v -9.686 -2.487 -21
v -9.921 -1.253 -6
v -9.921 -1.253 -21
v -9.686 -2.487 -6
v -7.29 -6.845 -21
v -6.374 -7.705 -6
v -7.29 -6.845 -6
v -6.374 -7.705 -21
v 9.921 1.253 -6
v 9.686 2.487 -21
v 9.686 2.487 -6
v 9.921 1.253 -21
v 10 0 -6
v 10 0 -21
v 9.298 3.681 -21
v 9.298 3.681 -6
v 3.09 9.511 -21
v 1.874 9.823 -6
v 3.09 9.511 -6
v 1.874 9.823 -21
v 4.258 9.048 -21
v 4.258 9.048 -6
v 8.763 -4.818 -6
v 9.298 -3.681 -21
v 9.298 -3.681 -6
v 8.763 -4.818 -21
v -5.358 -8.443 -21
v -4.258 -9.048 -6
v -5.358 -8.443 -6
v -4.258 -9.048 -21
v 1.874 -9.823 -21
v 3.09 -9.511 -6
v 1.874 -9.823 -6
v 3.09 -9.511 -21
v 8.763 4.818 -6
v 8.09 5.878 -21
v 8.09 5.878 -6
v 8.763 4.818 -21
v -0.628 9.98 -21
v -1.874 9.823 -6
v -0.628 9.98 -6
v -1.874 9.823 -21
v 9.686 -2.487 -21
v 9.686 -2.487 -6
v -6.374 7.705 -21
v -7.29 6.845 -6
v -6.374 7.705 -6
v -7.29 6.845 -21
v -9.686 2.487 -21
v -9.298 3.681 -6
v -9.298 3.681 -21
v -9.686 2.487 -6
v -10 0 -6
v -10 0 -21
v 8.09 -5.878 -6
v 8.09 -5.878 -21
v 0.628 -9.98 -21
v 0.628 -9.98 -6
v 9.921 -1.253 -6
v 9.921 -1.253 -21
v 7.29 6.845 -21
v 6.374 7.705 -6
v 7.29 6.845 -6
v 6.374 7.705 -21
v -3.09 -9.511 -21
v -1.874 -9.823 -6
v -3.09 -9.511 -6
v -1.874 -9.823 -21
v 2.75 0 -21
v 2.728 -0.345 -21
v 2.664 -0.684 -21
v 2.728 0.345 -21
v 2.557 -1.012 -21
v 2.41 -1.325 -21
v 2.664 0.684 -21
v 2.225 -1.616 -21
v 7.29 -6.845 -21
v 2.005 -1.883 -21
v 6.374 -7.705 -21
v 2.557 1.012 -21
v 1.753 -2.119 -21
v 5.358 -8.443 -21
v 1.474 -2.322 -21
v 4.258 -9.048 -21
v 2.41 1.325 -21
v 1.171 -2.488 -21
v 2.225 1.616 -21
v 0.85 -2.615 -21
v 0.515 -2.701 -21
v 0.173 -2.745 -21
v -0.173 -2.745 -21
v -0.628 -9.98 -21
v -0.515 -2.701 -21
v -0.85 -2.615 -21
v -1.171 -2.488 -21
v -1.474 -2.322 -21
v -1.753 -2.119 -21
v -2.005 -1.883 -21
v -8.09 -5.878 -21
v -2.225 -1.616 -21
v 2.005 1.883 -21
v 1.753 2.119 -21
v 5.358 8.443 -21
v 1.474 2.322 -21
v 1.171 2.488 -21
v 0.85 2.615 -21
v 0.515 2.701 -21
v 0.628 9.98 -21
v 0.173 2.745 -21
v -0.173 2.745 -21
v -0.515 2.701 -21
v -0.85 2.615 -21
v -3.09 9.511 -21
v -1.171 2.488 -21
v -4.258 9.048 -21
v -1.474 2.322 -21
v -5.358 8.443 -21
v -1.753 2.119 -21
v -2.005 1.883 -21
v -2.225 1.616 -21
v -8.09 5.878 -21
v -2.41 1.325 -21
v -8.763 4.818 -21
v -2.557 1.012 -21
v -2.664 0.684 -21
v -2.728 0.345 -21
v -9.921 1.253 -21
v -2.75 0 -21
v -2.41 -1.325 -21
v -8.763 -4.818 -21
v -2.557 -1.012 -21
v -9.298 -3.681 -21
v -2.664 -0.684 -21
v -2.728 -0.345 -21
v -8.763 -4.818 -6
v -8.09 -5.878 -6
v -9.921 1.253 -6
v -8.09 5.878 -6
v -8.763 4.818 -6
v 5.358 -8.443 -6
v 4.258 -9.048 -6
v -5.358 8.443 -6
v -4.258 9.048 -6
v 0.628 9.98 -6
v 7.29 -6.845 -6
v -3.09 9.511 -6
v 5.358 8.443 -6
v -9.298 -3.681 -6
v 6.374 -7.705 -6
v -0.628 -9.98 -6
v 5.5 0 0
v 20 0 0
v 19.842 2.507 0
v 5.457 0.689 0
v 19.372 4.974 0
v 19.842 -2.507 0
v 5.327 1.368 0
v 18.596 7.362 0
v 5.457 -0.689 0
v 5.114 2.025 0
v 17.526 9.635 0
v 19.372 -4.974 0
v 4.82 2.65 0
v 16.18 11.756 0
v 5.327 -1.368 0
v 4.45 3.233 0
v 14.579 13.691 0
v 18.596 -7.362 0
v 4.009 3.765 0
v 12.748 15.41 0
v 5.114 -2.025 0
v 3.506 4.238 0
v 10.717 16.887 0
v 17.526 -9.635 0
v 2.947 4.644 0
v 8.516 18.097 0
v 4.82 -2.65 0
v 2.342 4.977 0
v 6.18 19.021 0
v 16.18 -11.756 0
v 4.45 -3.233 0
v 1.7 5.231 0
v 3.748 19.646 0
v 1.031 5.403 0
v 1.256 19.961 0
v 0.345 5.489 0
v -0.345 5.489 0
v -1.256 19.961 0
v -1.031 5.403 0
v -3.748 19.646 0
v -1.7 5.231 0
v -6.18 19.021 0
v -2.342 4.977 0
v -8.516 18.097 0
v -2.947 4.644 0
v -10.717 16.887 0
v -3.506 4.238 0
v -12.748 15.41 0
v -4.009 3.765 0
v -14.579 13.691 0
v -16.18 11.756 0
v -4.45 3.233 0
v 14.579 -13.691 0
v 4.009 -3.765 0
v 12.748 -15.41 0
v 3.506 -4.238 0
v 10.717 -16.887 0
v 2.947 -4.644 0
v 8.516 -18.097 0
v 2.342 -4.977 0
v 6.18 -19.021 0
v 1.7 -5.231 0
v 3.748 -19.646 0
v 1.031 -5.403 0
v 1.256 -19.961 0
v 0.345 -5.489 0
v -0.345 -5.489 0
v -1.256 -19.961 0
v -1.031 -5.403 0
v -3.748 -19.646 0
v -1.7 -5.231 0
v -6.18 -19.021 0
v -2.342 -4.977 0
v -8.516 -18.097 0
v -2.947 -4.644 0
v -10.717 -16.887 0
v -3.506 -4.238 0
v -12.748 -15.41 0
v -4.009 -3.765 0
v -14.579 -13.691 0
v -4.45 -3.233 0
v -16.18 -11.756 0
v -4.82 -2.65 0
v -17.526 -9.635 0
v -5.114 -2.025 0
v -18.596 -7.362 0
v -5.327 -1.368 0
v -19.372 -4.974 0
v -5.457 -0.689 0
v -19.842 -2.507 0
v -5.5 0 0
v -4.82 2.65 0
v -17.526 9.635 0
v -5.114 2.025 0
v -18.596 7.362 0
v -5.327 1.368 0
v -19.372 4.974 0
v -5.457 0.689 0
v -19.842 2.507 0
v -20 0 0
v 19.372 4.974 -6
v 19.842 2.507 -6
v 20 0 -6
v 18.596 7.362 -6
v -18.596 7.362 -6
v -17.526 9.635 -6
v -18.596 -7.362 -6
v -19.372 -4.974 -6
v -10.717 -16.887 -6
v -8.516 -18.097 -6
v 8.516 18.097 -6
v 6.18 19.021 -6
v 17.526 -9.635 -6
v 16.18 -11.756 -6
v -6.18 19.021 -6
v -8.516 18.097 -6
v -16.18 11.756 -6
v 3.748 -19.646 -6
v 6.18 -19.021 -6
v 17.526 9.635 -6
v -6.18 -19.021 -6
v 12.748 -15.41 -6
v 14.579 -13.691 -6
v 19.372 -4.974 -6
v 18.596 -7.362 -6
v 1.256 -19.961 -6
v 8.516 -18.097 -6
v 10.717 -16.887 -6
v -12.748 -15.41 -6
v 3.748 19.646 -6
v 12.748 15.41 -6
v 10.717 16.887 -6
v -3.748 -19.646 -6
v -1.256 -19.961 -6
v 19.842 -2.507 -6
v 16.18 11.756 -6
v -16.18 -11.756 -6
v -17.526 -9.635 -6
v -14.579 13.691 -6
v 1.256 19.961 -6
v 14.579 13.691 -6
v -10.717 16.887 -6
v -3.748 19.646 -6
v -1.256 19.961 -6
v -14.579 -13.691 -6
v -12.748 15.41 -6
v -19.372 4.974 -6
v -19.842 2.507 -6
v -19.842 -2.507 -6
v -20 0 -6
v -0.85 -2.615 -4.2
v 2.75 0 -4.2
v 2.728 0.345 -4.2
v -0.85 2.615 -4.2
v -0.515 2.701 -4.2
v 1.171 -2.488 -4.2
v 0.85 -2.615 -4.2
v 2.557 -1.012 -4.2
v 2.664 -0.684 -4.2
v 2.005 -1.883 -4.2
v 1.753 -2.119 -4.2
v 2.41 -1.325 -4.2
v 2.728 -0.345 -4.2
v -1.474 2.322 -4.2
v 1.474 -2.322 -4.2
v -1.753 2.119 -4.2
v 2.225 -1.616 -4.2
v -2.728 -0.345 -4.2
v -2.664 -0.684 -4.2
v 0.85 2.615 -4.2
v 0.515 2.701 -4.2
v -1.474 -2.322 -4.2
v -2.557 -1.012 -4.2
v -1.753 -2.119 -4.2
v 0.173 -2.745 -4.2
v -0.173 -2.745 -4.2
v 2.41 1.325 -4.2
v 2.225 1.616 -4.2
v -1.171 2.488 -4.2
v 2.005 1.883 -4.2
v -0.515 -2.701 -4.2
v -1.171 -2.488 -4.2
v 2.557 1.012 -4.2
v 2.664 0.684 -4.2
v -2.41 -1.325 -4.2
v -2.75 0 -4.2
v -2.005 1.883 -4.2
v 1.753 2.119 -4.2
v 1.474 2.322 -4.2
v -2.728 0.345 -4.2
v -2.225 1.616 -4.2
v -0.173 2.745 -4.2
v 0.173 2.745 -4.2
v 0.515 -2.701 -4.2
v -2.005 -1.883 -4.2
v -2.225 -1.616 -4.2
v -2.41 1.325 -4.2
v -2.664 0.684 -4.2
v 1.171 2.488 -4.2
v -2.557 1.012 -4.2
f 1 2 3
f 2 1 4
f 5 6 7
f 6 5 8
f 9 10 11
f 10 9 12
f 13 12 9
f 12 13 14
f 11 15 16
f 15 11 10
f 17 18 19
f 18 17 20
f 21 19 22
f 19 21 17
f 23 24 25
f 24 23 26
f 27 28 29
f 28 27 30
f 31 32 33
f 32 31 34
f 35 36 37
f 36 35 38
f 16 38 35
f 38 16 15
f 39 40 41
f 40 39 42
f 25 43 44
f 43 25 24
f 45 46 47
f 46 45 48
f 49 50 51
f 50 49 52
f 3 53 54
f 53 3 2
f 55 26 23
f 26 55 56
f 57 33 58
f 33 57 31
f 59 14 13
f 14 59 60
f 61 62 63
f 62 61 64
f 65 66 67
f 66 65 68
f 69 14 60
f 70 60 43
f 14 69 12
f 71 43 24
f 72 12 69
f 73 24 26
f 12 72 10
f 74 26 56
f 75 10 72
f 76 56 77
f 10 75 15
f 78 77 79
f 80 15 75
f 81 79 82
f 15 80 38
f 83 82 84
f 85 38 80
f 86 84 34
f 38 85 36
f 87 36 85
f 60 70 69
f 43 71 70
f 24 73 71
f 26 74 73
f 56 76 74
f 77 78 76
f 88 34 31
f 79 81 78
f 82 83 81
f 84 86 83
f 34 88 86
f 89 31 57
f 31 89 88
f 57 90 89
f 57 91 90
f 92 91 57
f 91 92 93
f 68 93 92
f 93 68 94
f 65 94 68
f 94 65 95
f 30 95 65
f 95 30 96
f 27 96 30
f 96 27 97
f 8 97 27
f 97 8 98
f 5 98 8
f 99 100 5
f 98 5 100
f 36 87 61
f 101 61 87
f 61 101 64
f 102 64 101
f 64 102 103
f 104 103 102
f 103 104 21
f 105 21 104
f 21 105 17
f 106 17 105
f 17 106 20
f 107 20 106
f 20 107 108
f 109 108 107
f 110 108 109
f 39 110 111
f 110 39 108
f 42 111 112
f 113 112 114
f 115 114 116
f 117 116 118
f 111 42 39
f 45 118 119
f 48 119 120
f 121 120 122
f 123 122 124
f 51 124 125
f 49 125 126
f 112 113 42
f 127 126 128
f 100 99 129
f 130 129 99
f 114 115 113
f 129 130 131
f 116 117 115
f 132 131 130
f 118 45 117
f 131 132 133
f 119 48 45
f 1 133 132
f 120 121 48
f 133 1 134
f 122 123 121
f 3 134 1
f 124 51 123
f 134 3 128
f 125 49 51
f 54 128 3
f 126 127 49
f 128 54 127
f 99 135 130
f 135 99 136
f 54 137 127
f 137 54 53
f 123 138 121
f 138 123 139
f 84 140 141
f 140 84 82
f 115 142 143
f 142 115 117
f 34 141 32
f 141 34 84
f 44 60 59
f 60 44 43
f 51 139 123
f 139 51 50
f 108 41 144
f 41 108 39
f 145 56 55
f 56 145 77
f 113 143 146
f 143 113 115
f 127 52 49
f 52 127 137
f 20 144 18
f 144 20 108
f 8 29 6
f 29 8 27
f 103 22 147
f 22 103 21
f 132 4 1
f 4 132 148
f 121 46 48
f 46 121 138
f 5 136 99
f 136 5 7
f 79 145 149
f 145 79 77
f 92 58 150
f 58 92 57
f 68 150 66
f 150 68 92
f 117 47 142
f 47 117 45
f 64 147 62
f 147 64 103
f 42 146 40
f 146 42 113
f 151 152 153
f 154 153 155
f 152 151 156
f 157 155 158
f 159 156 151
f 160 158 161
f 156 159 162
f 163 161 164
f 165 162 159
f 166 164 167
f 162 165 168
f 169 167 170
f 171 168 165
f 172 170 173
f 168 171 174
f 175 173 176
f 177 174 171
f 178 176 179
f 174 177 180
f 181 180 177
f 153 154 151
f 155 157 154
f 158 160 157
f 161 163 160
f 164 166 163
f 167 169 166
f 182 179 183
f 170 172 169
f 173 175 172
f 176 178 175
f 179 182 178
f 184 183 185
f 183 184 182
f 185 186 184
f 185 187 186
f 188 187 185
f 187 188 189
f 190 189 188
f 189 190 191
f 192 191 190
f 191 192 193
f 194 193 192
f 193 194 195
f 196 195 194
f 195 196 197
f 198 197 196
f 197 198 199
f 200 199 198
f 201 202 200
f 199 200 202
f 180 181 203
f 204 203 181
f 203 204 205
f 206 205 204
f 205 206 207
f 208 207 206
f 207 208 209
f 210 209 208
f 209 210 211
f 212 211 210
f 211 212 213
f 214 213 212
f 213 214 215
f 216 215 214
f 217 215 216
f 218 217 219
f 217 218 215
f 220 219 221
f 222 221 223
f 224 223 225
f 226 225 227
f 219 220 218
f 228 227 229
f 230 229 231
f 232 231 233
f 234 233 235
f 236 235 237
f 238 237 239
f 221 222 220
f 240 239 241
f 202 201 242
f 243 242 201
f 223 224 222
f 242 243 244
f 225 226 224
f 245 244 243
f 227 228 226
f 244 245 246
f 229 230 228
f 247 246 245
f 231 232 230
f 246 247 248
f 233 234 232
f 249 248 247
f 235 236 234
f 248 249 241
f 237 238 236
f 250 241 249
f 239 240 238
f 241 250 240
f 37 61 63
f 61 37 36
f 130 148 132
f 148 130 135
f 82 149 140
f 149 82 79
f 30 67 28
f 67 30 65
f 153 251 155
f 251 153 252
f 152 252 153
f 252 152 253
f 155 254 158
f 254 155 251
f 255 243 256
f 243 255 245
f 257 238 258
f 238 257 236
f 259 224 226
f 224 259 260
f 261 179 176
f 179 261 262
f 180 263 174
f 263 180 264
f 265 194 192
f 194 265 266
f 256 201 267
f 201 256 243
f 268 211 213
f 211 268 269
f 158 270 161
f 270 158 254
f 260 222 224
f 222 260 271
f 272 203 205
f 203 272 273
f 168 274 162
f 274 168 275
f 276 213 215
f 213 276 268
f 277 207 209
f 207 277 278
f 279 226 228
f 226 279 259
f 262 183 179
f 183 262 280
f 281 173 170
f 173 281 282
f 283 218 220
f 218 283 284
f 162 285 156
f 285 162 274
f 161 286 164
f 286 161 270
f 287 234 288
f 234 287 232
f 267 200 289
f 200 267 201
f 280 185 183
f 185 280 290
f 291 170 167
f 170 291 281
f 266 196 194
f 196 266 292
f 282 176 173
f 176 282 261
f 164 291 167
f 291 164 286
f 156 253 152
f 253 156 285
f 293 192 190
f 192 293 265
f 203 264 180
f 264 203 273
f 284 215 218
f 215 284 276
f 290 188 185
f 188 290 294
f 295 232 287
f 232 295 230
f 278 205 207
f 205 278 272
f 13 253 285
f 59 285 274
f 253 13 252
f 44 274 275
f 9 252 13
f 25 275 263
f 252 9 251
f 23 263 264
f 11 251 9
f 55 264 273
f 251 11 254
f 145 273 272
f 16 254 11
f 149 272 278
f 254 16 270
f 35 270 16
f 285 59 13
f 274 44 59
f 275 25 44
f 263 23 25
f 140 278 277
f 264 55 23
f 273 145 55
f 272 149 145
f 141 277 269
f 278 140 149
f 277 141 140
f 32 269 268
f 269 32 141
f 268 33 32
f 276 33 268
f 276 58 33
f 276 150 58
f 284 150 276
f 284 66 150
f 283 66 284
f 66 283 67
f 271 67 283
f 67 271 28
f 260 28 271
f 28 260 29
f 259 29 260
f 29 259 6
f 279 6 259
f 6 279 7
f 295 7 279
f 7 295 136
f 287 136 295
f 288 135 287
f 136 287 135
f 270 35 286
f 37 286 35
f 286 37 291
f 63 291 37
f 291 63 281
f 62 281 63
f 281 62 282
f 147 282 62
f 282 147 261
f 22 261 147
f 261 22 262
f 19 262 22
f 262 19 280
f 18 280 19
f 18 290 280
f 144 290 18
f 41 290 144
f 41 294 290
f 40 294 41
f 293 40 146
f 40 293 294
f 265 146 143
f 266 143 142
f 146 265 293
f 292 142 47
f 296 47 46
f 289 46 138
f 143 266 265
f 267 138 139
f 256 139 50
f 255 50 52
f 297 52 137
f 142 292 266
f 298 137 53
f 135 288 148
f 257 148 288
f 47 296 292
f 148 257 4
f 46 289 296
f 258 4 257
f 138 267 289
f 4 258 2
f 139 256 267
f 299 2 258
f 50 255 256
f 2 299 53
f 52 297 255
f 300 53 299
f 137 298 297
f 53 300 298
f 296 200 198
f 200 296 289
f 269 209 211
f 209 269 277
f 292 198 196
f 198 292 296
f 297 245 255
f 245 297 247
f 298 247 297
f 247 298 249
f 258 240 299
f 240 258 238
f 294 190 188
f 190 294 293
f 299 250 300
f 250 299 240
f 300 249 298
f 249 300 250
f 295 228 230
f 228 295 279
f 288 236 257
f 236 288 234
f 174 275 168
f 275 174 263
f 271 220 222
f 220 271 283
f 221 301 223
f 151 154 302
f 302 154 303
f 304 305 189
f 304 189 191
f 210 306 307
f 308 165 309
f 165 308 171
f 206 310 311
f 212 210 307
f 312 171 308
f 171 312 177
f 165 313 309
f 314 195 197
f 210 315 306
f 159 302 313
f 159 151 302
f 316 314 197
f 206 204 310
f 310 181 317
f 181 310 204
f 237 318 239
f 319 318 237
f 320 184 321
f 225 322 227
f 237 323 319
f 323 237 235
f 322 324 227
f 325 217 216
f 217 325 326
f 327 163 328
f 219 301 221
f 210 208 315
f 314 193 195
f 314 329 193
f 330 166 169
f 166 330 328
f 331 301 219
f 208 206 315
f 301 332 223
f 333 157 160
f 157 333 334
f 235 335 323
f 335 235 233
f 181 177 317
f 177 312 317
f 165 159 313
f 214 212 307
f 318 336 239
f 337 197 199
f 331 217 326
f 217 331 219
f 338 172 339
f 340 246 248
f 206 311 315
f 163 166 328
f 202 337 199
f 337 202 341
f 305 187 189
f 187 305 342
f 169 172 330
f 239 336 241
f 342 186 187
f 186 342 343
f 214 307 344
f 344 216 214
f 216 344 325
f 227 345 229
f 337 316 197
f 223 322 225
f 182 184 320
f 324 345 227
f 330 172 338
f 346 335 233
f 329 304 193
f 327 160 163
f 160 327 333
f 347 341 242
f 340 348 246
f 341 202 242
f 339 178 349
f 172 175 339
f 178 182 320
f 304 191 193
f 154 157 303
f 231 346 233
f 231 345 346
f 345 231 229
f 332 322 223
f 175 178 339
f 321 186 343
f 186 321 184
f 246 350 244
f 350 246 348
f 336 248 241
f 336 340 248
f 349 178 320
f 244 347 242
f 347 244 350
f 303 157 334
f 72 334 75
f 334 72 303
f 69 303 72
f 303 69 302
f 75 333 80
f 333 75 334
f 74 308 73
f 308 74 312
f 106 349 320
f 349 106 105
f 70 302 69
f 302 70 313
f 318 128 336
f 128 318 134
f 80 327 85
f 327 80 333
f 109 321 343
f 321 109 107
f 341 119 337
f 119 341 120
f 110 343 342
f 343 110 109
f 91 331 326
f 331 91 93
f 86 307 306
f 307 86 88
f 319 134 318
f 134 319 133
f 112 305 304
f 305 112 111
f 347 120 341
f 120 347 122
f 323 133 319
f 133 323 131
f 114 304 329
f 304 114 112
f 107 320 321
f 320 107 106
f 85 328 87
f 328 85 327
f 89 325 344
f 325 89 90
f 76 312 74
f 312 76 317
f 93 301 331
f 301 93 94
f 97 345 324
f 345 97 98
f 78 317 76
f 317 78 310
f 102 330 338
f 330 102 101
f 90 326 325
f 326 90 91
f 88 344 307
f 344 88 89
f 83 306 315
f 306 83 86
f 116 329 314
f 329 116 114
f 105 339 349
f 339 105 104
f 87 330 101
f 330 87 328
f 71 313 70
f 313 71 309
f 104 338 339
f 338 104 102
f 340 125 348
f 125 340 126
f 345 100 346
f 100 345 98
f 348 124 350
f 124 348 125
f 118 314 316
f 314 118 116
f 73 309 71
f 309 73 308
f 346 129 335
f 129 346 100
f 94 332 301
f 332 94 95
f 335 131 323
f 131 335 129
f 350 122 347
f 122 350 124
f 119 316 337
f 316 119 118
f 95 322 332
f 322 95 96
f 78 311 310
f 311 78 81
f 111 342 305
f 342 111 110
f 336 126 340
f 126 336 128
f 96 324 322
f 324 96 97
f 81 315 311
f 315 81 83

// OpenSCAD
$fn = 50;


difference() {
	union() {
		translate(v = [0, 0, -21.0000000000]) {
			cylinder(h = 21, r = 10.0000000000);
		}
		translate(v = [0, 0, -6.0000000000]) {
			cylinder(h = 6, r = 20.0000000000);
		}
	}
	union() {
		translate(v = [0, 0, 0]) {
			rotate(a = [0, 0, 0]) {
				difference() {
					union() {
						#translate(v = [0, 0, -21.0000000000]) {
							cylinder(h = 21, r = 2.2500000000);
						}
						#translate(v = [0, 0, -4.2000000000]) {
							cylinder(h = 4.2000000000, r1 = 2.7500000000, r2 = 5.5000000000);
						}
						#translate(v = [0, 0, -21.0000000000]) {
							cylinder(h = 21, r = 2.7500000000);
						}
						#translate(v = [0, 0, -21.0000000000]) {
							cylinder(h = 21, r = 2.2500000000);
						}
					}
					union();
				}
			}
		}
	}
}
